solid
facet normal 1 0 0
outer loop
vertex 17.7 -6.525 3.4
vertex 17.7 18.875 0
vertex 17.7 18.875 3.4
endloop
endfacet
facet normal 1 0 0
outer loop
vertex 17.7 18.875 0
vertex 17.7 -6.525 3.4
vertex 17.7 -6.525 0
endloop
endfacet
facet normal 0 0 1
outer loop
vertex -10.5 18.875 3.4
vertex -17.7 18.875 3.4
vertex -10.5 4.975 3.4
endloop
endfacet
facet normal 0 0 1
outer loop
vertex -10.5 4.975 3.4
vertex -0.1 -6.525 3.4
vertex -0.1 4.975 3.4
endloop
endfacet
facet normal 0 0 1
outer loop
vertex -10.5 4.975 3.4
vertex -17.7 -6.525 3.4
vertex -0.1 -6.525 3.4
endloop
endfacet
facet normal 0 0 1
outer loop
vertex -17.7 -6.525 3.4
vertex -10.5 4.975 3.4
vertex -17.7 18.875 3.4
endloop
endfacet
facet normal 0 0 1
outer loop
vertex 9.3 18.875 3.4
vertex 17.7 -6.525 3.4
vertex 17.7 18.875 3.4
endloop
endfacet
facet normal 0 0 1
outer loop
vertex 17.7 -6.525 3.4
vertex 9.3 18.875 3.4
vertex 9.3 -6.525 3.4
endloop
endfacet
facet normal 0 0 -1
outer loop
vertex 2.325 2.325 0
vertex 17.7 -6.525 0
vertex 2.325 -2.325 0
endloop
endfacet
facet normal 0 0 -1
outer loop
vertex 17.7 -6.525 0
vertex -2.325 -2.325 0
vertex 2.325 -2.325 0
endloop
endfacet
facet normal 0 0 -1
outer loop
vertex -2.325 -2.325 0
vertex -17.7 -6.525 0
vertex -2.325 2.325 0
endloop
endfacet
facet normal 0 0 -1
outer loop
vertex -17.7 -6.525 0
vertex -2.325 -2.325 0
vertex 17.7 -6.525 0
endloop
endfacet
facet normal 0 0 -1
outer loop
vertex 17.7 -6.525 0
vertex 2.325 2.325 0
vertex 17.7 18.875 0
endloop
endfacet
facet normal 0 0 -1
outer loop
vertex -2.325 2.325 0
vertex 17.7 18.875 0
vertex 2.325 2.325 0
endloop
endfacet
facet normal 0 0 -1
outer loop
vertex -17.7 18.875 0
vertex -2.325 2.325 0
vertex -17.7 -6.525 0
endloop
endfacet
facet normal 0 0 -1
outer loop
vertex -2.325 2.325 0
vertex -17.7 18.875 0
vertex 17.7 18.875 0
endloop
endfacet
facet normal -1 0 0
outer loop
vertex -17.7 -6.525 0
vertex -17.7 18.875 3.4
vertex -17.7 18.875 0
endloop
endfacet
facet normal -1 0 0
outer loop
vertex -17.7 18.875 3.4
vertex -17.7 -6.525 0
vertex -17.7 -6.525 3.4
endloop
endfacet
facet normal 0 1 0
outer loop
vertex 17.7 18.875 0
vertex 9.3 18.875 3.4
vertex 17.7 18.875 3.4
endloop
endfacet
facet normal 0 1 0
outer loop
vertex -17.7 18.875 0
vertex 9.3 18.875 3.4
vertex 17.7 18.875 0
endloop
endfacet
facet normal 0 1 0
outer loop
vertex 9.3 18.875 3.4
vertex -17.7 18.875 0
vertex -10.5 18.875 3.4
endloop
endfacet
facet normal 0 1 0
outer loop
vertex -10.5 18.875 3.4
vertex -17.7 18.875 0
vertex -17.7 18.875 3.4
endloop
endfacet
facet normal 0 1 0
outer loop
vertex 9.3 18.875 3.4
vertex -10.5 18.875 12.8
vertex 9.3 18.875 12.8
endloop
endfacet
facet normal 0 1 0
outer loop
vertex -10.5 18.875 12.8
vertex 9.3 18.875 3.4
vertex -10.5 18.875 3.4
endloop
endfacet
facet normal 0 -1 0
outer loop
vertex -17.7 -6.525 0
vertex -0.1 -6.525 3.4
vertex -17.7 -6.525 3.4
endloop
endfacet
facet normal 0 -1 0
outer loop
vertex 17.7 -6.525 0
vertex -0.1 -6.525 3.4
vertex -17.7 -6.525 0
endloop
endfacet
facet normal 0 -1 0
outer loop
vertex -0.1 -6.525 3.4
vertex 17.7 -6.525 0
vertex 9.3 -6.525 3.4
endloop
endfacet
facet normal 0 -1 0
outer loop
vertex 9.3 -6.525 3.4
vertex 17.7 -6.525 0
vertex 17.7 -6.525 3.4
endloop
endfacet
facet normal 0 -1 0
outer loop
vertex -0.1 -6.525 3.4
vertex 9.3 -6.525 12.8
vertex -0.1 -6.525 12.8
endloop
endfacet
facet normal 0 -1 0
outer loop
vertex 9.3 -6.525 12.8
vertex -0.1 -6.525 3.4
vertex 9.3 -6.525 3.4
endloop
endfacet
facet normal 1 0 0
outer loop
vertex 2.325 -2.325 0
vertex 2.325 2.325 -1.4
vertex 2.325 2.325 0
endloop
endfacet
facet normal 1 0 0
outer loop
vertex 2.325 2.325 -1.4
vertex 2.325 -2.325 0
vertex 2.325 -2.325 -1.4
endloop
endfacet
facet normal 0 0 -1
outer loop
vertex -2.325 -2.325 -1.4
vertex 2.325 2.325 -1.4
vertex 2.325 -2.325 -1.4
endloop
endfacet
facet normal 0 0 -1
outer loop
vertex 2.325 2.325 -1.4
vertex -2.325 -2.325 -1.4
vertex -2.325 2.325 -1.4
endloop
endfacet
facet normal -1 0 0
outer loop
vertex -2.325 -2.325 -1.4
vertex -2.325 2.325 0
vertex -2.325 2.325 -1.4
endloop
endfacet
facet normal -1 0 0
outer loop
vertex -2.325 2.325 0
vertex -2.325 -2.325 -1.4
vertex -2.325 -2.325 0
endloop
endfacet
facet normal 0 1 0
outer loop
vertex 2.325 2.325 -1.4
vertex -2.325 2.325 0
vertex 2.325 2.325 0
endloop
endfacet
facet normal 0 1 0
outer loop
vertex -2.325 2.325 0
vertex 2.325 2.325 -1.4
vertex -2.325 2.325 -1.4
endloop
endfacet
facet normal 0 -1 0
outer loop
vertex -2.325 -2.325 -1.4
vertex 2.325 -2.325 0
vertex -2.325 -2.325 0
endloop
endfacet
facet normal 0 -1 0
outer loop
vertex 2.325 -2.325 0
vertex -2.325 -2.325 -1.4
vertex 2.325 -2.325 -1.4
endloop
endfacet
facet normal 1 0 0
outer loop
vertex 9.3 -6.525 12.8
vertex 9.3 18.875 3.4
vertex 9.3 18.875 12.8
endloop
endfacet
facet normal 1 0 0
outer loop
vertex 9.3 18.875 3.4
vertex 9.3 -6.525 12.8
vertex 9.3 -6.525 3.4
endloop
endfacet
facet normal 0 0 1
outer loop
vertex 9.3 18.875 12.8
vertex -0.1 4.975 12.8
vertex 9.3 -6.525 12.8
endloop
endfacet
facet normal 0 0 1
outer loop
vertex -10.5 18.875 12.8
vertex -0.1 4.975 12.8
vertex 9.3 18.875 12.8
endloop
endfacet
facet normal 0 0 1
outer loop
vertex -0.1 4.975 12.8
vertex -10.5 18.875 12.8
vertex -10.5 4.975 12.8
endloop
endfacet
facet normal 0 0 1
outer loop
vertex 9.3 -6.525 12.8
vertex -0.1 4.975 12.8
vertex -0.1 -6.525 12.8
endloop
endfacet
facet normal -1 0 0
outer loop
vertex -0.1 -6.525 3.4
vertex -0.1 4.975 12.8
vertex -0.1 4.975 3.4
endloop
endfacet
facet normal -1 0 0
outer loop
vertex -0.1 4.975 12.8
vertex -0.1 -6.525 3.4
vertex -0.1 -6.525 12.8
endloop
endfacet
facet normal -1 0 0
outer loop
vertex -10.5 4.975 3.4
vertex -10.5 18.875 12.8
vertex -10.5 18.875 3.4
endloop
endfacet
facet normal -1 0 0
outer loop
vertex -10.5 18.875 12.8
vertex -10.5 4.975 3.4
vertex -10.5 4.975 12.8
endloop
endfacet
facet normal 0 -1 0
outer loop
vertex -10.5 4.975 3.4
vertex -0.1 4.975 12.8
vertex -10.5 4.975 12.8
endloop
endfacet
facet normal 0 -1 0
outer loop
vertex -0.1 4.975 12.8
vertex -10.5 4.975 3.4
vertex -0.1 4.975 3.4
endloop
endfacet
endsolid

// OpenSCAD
// file: LinearBearing.scad
use <../Tolerance.scad>

function LinearBearingDiam() = 15 + 3dPrinterTolerance();
function LinearBearingInnerDiam() = 8.3 + 3dPrinterTolerance();
function LinearBearingHeight() = 24 + 3dPrinterTolerance();

module LinearBearing()
{
cylinder(LinearBearingHeight(), LinearBearingDiam()/2, LinearBearingDiam()/2, 0);
}


LinearBearing();
// file: Zrod.scad
use <../Tolerance.scad>

function ZrodLength()=1000;
function ZrodDiameter()=8 + 3dPrinterTolerance();  //base case: 8
function ZrodRadius()=ZrodDiameter()/2;

module Zrod()
{
color("Silver")
cylinder(ZrodLength(), ZrodRadius(), ZrodRadius());
}

Zrod();
// file: PlasticScrew.scad
use <../Tolerance.scad>

function ScrewDiameter()= 3.6 + 3dPrinterTolerance();  
function ScrewLength()= 22 + 3dPrinterTolerance();
function ScrewHeadDiameter()= 6.7 + 3dPrinterTolerance();
function ScrewHeadHeight()= 2.5 + 3dPrinterTolerance();

//err on the side of smaller tolerances for screws

module screw()
{
	union()
	{
		translate([0,0,-ScrewLength()])
		{
			cylinder(ScrewLength(), ScrewDiameter()/2,ScrewDiameter()/2);
		}
		cylinder(ScrewHeadHeight(), ScrewHeadDiameter()/2,ScrewHeadDiameter()/2);
	}
}

screw();
// file: ../Parameters.scad
use<Vitamins/Zrod.scad>
use<Vitamins/LinearBearing.scad>

function mm(i) = i*25.4; 

//Build dimensions (x,y,z)-- x, y and z of printable area, NOT of overall device

//z-rod length, diameter-- dependent on which rods you buy
//(bearing diameter is dependent on rod diameter)


function ZBearingSpacing()= 105;
function ZrodSpacing()=ZBearingSpacing()-LinearBearingDiam()*2-PlasticWidth()*4;
//echo(ZrodSpacing());

//parametric of which hotend is being used (printerbot or bucha nozzle)

//stepper vs servo

//3 parameters (1 for each link) horizontal vs vertical

//paper is a parametric vitamin

//distance between link arms will be calculable based on radius of toolplate




//tolerances
//function LaserCutTolerance() = .02;
//function 3dPrinterTolerance() = .4;



//the equation used for plastic width, it can of course be changed
function PlasticWidth()= (ZrodDiameter()/2);
function SideWidth() = (ZrodDiameter()+PlasticWidth());
// file: ../Tolerance.scad
function LaserCutTolerance() = .02;
function 3dPrinterTolerance() = .4;
// main file
use <../Tolerance.scad>
use <../Parameters.scad>
use <PlasticScrew.scad>
 
function EncoderWidth()=35 + 3dPrinterTolerance();
function EncoderHeight()=25 + 3dPrinterTolerance();
function EncoderThickness()=3 + 3dPrinterTolerance();

function EncoderBoltWidth()=3 + 3dPrinterTolerance();
function EncoderBoltLength()=20 + 3dPrinterTolerance();
function EncoderBoltInset()=2.2 + 3dPrinterTolerance()/2;

function EncoderLongBoxWidth()=9 + 3dPrinterTolerance();

function EncoderShortBoxWidth()=10 + 3dPrinterTolerance();
function EncoderShortBoxLength()=13.5 + 3dPrinterTolerance();
function EncoderShortBoxInset()=7 + 3dPrinterTolerance()/2;

function EncoderBoxHeight()=9+EncoderThickness() + 3dPrinterTolerance();

function EncoderChipSide()=4.25 + 3dPrinterTolerance();
function EncoderChipHeight()= 1 + 3dPrinterTolerance();
function EncoderChipOffset()=4 + 3dPrinterTolerance()/2;



module Encoder(Bolts=false)
{
	//centers the encoder on the chip, which is the important part
	translate([-EncoderWidth()/2,-EncoderChipOffset()-EncoderChipSide()/2,0])
	{
		union()
		{
	//base
			cube([EncoderWidth(), EncoderHeight(), EncoderThickness()]);
	//chip
			translate([EncoderWidth()/2-EncoderChipSide()/2, EncoderChipOffset(), -EncoderChipHeight()])
			{
			cube([EncoderChipSide(), EncoderChipSide(),EncoderChipHeight()]);
			}
	//boxes
			translate([EncoderShortBoxInset()+EncoderShortBoxWidth(),0,0])
			{
				cube([EncoderLongBoxWidth(), EncoderHeight(), EncoderBoxHeight()]);
			}
			translate([EncoderShortBoxInset(),EncoderHeight()-EncoderShortBoxLength(),0])
			{	
				cube([EncoderShortBoxWidth(), EncoderShortBoxLength(), EncoderBoxHeight()]);
			}
		if(Bolts==true)
		{
	//screws
			translate([EncoderBoltInset(),EncoderBoltInset(),-EncoderBoltLength()/2])
			{
				cylinder(EncoderBoltLength(), EncoderBoltWidth()/2, EncoderBoltWidth()/2);
			}
			translate([EncoderWidth()-EncoderBoltInset(),EncoderBoltInset(),-EncoderBoltLength()/2])
			{
				cylinder(EncoderBoltLength(), EncoderBoltWidth()/2, EncoderBoltWidth()/2);
			}
			translate([EncoderBoltInset(),EncoderHeight()-EncoderBoltInset(),-EncoderBoltLength()/2])
			{
				cylinder(EncoderBoltLength(), EncoderBoltWidth()/2, EncoderBoltWidth()/2);
			}
			translate([EncoderWidth()-EncoderBoltInset(),EncoderHeight()-EncoderBoltInset(),-EncoderBoltLength()/2])
			{
				cylinder(EncoderBoltLength(), EncoderBoltWidth()/2, EncoderBoltWidth()/2);
			}
		}else{}
		}
	}
}

Encoder();



module EncoderSlot()
{
	union()
	{
		Encoder();
		translate([-EncoderWidth()/2, -EncoderHeight()+EncoderChipOffset(), 0])
		{
			cube([EncoderWidth(),PlasticWidth()*4, EncoderThickness()]);
		}
		translate([-(EncoderLongBoxWidth()+EncoderShortBoxWidth())/2-1,-(EncoderHeight()+PlasticWidth()*4)/2-1,0])
		{
			cube([EncoderLongBoxWidth()+EncoderShortBoxWidth()+1,EncoderHeight()+PlasticWidth()*8,EncoderHeight()]);
		}
		//screws
		translate([-EncoderWidth()/2+PlasticWidth()/2,-EncoderChipOffset()-PlasticWidth()-3dPrinterTolerance(),EncoderBoltLength()/2])
		{
			#screw();
		}
		translate([EncoderWidth()/2-PlasticWidth()/2,-EncoderChipOffset()-PlasticWidth()-3dPrinterTolerance(),EncoderBoltLength()/2])
		{
			#screw();
		}
	}
}

%EncoderSlot();
